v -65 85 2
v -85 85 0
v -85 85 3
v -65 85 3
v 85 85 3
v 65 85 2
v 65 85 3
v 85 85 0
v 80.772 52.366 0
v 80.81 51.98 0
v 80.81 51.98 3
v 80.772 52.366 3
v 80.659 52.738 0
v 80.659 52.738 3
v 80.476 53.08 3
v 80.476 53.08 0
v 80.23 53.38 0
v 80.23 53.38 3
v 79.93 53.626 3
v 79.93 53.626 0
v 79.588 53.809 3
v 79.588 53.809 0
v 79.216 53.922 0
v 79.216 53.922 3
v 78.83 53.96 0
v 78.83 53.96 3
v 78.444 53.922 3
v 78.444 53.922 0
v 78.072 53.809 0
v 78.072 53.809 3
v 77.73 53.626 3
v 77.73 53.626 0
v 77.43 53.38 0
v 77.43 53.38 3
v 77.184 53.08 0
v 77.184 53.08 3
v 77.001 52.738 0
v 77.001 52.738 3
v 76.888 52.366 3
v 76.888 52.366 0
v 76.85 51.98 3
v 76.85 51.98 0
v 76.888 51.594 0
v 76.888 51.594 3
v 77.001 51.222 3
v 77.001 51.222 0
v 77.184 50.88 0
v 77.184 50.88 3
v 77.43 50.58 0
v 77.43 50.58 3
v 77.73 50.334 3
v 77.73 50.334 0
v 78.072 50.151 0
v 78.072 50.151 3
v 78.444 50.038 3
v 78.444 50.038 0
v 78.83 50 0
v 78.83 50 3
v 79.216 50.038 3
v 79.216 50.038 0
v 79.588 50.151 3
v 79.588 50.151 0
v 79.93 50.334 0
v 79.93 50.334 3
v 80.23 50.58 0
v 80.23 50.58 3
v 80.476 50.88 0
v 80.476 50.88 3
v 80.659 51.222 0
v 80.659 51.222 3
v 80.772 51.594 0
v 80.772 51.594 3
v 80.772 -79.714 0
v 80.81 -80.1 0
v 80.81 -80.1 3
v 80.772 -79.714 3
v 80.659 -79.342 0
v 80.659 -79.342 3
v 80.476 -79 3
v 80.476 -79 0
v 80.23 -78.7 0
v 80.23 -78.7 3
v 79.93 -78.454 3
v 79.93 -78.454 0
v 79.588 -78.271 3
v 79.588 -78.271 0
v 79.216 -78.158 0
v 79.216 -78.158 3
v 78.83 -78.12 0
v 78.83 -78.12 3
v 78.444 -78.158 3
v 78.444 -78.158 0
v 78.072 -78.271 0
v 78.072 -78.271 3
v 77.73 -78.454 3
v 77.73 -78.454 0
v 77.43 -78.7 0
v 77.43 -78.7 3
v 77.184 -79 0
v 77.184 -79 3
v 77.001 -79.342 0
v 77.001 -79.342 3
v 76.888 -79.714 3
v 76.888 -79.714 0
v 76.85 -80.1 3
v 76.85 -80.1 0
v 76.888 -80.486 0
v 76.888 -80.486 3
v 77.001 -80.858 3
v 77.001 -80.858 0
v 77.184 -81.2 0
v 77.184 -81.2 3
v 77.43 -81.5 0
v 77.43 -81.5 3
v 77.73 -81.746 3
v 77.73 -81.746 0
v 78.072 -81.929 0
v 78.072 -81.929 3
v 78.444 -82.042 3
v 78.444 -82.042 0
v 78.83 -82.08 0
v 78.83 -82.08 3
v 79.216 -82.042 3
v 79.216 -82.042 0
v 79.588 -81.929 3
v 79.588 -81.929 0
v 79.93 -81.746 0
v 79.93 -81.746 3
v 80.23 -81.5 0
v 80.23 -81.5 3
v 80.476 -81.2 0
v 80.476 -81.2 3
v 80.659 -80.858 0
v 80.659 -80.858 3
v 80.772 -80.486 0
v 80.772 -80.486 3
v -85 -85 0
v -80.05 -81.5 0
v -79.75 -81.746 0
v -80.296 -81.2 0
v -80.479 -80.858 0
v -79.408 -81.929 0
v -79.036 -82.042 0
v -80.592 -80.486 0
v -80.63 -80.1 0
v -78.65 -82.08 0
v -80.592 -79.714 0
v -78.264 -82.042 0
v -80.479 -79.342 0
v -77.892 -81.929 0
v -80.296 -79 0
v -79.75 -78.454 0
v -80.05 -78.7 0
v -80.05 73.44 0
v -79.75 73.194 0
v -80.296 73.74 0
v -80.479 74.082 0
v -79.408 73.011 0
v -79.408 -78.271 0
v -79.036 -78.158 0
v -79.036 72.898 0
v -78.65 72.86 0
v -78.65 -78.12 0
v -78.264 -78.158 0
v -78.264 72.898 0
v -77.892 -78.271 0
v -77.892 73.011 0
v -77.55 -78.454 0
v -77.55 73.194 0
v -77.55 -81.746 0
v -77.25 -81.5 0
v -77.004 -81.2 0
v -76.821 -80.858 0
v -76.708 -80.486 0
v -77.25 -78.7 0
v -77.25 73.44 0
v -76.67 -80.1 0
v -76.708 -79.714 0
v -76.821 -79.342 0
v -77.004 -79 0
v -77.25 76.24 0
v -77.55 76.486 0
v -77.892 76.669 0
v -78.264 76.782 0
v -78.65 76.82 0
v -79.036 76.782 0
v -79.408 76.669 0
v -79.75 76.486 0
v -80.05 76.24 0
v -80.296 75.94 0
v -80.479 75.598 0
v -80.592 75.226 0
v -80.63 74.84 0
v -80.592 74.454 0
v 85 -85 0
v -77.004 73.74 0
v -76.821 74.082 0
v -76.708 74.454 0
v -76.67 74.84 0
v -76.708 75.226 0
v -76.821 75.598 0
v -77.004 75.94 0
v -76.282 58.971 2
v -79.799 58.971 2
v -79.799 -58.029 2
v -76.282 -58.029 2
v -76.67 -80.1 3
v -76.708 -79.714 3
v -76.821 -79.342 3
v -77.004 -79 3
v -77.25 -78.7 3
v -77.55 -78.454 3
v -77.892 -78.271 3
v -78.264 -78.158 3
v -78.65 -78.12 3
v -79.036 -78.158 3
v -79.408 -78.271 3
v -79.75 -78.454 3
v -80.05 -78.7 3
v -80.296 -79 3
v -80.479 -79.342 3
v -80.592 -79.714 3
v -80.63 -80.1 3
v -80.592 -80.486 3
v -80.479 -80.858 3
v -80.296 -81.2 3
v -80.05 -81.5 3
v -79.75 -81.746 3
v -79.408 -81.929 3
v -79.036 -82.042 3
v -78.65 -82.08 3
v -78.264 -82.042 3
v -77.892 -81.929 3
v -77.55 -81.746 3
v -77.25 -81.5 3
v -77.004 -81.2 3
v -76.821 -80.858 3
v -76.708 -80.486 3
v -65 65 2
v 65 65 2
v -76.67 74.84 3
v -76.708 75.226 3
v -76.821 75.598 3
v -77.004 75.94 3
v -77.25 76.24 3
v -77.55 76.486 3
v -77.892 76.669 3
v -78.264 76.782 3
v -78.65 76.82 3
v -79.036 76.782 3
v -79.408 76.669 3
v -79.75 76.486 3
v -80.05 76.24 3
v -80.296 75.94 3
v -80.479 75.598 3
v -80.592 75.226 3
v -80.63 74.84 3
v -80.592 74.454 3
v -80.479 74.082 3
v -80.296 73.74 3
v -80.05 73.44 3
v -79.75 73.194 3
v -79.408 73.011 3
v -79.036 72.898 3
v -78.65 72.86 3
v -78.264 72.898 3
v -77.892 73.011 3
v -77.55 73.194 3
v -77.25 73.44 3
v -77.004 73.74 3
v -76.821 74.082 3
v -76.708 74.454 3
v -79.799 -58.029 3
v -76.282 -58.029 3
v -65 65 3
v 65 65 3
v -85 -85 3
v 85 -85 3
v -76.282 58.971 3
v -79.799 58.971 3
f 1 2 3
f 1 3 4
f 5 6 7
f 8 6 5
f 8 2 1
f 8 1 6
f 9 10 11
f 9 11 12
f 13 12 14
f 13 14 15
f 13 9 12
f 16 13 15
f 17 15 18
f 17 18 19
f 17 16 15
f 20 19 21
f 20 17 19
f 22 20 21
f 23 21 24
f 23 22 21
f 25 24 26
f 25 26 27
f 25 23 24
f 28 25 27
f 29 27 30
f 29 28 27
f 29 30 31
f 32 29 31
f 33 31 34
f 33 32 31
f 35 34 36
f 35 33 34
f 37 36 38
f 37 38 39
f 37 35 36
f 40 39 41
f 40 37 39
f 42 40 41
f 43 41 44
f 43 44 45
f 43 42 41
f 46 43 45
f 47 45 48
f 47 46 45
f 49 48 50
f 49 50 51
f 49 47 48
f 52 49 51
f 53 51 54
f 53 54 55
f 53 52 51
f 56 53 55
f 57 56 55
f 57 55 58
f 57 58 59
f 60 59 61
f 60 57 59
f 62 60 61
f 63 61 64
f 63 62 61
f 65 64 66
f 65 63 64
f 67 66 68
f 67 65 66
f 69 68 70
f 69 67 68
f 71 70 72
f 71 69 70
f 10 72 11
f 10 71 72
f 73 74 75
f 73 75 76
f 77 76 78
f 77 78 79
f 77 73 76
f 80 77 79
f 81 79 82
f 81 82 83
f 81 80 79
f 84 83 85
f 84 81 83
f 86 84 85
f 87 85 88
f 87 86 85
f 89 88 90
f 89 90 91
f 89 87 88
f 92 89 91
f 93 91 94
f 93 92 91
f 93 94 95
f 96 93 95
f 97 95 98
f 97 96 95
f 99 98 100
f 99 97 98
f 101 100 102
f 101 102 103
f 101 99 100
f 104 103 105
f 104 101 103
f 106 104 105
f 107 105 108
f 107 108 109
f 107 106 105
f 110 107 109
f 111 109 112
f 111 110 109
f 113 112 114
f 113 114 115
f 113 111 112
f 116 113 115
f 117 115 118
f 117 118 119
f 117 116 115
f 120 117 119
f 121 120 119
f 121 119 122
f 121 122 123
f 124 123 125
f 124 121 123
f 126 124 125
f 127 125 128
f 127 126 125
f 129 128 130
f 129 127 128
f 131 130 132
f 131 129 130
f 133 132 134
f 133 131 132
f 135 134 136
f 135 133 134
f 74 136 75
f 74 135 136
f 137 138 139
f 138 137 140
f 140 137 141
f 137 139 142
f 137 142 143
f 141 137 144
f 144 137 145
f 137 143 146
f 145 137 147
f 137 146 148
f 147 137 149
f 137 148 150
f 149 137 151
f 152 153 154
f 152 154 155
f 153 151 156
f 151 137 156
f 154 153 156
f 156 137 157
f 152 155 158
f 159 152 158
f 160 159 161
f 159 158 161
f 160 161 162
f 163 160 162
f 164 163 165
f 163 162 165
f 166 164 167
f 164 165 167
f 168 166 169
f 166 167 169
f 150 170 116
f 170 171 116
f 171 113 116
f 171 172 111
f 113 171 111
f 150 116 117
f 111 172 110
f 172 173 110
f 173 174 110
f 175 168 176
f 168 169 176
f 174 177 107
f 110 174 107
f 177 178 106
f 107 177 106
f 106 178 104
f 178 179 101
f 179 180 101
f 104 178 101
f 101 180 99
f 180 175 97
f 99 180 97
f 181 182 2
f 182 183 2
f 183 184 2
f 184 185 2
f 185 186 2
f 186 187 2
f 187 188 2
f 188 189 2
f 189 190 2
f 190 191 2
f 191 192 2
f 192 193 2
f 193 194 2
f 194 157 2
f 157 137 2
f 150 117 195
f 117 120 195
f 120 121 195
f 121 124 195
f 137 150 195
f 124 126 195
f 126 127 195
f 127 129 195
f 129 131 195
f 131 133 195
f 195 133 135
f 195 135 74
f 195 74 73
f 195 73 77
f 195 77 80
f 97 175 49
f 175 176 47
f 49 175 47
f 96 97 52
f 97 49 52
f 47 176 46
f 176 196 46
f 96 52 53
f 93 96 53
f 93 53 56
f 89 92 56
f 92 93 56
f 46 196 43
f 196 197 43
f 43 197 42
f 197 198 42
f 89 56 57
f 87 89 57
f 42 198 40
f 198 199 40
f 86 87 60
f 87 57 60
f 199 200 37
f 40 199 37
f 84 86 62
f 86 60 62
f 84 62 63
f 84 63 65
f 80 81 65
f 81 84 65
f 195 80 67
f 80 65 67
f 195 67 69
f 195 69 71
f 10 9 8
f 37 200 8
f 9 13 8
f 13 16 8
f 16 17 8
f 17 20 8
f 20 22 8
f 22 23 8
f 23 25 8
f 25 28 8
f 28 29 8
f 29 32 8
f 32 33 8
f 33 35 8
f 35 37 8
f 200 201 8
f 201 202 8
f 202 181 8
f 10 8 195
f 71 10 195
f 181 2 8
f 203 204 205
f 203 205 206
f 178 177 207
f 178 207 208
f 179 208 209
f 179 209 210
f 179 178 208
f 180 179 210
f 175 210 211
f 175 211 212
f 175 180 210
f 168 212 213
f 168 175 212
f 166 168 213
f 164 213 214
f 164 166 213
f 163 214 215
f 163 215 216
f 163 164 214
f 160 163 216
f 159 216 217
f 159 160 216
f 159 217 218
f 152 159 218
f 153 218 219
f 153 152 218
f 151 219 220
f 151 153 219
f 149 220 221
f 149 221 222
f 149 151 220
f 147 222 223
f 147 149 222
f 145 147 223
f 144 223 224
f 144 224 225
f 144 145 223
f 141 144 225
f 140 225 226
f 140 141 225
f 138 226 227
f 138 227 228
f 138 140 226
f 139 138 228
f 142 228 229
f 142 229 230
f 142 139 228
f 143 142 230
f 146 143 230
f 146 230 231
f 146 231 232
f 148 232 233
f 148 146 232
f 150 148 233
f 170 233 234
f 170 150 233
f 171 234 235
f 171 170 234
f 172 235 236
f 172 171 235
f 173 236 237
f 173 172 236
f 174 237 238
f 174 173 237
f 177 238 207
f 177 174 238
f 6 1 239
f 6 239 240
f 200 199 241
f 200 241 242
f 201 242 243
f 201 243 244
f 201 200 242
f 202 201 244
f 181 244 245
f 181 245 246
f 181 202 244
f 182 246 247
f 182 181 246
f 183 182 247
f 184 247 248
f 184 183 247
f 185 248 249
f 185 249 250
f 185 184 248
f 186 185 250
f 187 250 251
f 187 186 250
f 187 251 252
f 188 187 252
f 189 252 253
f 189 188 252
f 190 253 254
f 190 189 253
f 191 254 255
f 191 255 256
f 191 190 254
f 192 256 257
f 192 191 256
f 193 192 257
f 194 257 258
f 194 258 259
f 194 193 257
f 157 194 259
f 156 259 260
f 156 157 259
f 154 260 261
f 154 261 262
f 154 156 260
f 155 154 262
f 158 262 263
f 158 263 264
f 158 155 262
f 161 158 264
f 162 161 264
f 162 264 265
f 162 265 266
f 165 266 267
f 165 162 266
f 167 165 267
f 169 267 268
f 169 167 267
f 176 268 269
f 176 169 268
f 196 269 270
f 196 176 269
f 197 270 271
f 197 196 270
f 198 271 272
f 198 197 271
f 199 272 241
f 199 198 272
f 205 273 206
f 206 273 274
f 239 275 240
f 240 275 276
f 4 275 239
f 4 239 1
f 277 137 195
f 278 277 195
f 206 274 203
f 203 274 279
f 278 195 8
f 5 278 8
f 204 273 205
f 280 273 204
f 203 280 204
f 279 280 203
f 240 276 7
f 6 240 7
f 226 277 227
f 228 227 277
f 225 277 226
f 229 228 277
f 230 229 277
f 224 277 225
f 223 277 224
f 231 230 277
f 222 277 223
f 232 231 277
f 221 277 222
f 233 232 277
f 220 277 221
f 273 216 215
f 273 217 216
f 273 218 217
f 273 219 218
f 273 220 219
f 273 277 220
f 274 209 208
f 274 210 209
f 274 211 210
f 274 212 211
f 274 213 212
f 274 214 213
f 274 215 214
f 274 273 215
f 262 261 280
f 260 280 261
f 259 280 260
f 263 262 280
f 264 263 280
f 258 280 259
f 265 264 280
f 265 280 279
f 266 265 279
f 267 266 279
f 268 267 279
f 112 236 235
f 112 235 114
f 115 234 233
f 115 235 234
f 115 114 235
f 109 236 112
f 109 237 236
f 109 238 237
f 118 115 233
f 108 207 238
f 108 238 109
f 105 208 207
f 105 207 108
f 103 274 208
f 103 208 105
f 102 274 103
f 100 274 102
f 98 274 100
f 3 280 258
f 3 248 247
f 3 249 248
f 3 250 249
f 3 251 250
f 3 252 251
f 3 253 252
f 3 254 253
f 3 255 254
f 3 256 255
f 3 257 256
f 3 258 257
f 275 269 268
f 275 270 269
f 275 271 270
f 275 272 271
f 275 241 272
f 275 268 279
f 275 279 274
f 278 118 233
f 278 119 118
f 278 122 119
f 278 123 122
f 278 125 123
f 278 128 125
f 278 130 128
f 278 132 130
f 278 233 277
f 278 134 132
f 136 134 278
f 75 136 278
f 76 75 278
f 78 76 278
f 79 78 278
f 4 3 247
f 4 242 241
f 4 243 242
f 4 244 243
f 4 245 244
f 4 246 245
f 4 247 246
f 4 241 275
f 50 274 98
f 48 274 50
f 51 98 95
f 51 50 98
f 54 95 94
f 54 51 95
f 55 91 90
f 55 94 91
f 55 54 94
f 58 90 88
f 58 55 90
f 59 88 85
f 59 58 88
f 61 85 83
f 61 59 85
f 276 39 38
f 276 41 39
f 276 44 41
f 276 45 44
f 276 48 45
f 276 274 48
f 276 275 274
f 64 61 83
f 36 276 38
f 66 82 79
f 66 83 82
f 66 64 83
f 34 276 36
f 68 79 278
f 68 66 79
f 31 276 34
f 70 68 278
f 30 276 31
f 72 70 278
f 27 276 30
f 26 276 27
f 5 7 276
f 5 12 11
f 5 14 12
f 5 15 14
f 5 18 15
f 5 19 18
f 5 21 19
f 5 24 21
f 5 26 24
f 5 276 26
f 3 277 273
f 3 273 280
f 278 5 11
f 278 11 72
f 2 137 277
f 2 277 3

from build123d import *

# Parameters (mm, degrees)
F0_W     = 170
F0_H     = 170
F0_R     = 1.98
F1_DEPTH = 3
F2_W     = 130
F2_H     = 20
F3_DEPTH = 1
F4_W     = 3.516979
F4_H     = 117.000129
F5_DEPTH = 1


with BuildPart() as f1:
    # F0 (on Top) → F1 (new body)
    with BuildSketch(Plane.XY):
        Rectangle(F0_W, F0_H)
        with Locations((-78.65, -80.1)):
            Circle(F0_R, mode=Mode.SUBTRACT)
        with Locations((78.83, -80.1)):
            Circle(F0_R, mode=Mode.SUBTRACT)
        with Locations((-78.65, 74.84)):
            Circle(F0_R, mode=Mode.SUBTRACT)
        with Locations((78.83, 51.98)):
            Circle(F0_R, mode=Mode.SUBTRACT)
    extrude(amount=F1_DEPTH)

    # F2 (on face) → F3 (cut)
    with BuildSketch(Plane.XY.offset(3)):
        with Locations((0, 75)):
            Rectangle(F2_W, F2_H)
    extrude(amount=-F3_DEPTH, mode=Mode.SUBTRACT)

    # F4 (on face) → F5 (cut, through all)
    with BuildSketch(Plane.XY.offset(3)):
        with Locations((-78.040425, 0.470964)):
            Rectangle(F4_W, F4_H)
    extrude(amount=-F5_DEPTH, mode=Mode.SUBTRACT)


solid = f1.part
